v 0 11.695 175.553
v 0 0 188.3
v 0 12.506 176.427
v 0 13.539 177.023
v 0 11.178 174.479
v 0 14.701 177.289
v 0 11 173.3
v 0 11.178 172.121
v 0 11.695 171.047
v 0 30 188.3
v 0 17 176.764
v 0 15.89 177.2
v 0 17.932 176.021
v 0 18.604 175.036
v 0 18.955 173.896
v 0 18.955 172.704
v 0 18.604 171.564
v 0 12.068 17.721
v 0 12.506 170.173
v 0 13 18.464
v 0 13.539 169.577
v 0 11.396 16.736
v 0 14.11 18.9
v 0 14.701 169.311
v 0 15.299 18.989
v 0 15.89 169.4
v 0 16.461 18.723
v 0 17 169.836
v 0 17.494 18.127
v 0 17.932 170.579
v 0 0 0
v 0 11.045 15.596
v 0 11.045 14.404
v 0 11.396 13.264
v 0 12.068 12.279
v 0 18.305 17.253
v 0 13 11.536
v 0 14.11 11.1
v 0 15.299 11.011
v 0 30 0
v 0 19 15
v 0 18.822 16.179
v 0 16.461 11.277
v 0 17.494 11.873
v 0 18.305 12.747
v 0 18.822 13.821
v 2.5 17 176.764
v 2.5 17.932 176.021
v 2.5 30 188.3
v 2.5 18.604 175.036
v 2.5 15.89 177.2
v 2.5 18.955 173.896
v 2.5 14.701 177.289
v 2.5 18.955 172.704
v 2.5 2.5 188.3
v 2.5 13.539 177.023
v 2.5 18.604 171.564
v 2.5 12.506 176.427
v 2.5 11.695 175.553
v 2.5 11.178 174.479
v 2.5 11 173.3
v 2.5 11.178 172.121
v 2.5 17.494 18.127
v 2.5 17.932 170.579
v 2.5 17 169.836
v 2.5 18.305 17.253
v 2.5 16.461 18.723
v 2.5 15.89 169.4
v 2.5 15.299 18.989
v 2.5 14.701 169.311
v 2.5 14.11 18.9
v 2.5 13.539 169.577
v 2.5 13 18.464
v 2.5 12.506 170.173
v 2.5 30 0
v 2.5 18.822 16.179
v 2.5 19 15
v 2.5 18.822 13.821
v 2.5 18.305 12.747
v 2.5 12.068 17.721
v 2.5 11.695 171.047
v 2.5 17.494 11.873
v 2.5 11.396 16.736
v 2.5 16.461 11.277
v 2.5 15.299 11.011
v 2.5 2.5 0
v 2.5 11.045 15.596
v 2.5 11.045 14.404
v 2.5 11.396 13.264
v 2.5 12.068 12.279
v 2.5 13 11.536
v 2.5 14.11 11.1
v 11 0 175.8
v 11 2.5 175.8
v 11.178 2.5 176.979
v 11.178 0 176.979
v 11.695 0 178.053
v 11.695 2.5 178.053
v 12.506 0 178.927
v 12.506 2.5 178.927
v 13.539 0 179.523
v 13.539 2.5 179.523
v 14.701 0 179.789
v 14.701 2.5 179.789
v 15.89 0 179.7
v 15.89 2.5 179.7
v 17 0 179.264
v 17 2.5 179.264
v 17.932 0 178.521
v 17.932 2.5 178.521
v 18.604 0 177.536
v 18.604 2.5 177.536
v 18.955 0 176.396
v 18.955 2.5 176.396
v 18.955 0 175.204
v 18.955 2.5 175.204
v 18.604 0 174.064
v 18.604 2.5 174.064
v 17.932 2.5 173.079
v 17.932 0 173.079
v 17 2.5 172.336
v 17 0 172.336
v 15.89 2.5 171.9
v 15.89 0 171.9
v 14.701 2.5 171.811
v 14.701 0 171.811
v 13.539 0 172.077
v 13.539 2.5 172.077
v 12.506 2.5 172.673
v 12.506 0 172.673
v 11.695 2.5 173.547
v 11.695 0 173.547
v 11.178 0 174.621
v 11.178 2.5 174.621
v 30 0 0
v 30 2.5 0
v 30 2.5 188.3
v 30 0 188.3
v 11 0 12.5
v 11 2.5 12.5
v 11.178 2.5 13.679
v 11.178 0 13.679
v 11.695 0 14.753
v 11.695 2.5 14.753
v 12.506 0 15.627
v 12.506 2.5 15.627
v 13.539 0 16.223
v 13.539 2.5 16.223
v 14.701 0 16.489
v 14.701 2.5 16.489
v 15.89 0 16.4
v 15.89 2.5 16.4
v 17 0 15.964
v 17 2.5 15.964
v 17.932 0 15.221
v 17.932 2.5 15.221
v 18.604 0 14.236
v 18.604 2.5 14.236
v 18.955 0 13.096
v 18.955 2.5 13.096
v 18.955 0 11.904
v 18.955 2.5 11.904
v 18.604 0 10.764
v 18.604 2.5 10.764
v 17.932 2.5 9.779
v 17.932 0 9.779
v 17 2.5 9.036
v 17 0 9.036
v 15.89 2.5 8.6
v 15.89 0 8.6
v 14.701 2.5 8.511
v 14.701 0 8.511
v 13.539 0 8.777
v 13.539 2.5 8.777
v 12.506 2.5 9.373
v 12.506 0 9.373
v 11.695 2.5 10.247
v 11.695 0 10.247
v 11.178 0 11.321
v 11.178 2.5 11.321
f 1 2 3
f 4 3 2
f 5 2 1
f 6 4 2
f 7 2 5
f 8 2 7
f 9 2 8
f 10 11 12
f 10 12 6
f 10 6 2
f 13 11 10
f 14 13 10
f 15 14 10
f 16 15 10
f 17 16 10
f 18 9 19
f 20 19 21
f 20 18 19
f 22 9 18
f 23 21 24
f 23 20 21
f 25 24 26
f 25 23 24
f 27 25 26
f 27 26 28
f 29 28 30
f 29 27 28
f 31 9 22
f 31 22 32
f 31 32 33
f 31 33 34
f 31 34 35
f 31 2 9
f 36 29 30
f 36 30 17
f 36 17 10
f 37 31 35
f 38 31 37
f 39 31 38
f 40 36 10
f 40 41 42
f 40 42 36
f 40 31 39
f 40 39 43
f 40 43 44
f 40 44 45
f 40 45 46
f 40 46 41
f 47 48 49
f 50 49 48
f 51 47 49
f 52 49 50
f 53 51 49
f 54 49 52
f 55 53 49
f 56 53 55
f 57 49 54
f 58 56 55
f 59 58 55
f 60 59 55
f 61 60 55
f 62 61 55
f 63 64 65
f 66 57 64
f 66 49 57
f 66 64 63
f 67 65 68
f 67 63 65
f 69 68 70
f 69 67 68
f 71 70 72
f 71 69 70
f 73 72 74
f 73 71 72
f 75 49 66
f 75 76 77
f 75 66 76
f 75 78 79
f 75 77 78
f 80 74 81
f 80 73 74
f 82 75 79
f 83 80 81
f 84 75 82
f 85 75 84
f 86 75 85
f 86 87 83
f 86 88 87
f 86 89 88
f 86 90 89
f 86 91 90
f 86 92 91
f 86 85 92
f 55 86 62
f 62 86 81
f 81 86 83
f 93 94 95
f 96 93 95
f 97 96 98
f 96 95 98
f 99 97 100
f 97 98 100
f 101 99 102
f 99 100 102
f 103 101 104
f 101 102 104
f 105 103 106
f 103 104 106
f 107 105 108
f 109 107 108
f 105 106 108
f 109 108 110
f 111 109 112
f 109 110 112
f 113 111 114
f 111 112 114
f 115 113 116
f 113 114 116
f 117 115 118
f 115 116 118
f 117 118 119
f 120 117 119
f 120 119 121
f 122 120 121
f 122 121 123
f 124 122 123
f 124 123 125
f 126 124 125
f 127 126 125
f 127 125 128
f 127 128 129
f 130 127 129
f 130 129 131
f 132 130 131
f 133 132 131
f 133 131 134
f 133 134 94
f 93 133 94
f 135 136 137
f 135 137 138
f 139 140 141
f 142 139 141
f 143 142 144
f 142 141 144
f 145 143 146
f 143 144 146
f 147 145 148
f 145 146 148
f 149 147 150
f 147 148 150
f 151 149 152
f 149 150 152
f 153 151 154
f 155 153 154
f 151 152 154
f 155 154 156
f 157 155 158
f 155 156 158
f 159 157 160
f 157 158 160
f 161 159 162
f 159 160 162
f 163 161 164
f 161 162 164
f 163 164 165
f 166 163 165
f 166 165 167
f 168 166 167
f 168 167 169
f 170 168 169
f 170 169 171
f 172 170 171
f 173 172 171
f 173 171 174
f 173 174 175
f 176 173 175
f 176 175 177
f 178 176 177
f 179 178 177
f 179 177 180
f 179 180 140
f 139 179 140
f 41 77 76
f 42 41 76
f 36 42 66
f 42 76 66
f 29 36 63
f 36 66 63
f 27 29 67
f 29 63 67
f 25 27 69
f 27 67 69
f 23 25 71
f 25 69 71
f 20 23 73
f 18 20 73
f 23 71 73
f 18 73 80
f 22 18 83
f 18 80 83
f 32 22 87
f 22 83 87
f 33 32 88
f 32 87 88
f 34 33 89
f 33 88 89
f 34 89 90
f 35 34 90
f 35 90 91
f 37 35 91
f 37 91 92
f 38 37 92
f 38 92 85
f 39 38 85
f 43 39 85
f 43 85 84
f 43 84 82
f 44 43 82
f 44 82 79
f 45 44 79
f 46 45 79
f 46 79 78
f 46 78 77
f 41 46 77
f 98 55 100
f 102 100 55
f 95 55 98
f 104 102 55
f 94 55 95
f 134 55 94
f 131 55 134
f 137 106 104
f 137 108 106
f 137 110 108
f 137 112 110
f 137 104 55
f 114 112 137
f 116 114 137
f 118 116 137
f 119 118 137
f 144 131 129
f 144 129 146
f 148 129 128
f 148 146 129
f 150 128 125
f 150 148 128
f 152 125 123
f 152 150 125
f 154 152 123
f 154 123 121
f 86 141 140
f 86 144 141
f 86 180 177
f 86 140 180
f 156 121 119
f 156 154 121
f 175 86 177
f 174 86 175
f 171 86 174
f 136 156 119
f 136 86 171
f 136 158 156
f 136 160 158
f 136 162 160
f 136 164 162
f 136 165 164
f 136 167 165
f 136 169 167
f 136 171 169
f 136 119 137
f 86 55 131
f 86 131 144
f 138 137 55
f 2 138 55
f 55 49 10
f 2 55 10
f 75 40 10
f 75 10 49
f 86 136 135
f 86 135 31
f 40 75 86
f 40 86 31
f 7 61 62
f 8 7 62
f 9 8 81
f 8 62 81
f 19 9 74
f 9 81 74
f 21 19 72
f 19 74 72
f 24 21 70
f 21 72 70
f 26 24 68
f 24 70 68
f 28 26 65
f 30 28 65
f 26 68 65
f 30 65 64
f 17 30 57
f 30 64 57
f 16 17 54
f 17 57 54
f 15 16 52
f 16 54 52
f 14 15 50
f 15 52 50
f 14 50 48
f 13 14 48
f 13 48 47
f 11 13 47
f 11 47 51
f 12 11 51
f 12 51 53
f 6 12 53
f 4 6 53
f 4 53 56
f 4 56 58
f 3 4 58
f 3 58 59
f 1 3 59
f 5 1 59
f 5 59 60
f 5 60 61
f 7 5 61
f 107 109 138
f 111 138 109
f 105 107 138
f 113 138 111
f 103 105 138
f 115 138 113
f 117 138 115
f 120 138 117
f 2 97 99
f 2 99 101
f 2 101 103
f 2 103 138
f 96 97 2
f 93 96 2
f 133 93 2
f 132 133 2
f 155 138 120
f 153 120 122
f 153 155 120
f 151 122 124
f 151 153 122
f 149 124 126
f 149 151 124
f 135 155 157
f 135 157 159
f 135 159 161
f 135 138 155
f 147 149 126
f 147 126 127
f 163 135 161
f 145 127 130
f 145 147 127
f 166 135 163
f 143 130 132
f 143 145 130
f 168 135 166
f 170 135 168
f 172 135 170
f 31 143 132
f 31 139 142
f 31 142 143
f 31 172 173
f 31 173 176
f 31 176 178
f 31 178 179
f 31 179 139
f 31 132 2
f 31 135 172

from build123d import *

# Parameters (mm, degrees)
BOSS_EXTRUDE1_DEPTH = 188.3
SKETCH2_R           = 4
CUT_EXTRUDE1_DEPTH  = 193.647709563
SKETCH3_R           = 4
CUT_EXTRUDE2_DEPTH  = 193.647709563


with BuildPart() as part:
    # Sketch1 → Boss-Extrude1 (new body)
    with BuildSketch(Plane.XY):
        Polygon((0, 0), (0, 30), (2.5, 30), (2.5, 2.5), (30, 2.5), (30, 0), align=None)
    extrude(amount=BOSS_EXTRUDE1_DEPTH)

    # Sketch2 → Cut-Extrude1 (cut, through all)
    with BuildSketch(Plane(origin=(0, 2.5, 0), x_dir=(1, 0, 0), z_dir=(0, 1, 0))):
        with Locations(Location((15, -12.5, 0), (0, 0, 180))):
            Circle(SKETCH2_R)
        with Locations(Location((15, -175.8, 0), (0, 0, 180))):
            Circle(SKETCH2_R)
    extrude(amount=-CUT_EXTRUDE1_DEPTH, mode=Mode.SUBTRACT)

    # Sketch3 → Cut-Extrude2 (cut, through all)
    with BuildSketch(Plane(origin=(2.5, 0, 0), x_dir=(0, 0, -1), z_dir=(1, 0, 0))):
        with Locations(Location((-15, 15, 0), (0, 0, 90))):
            Circle(SKETCH3_R)
        with Locations(Location((-173.3, 15, 0), (0, 0, 270))):
            Circle(SKETCH3_R)
    extrude(amount=-CUT_EXTRUDE2_DEPTH, mode=Mode.SUBTRACT)


solid = part.part
